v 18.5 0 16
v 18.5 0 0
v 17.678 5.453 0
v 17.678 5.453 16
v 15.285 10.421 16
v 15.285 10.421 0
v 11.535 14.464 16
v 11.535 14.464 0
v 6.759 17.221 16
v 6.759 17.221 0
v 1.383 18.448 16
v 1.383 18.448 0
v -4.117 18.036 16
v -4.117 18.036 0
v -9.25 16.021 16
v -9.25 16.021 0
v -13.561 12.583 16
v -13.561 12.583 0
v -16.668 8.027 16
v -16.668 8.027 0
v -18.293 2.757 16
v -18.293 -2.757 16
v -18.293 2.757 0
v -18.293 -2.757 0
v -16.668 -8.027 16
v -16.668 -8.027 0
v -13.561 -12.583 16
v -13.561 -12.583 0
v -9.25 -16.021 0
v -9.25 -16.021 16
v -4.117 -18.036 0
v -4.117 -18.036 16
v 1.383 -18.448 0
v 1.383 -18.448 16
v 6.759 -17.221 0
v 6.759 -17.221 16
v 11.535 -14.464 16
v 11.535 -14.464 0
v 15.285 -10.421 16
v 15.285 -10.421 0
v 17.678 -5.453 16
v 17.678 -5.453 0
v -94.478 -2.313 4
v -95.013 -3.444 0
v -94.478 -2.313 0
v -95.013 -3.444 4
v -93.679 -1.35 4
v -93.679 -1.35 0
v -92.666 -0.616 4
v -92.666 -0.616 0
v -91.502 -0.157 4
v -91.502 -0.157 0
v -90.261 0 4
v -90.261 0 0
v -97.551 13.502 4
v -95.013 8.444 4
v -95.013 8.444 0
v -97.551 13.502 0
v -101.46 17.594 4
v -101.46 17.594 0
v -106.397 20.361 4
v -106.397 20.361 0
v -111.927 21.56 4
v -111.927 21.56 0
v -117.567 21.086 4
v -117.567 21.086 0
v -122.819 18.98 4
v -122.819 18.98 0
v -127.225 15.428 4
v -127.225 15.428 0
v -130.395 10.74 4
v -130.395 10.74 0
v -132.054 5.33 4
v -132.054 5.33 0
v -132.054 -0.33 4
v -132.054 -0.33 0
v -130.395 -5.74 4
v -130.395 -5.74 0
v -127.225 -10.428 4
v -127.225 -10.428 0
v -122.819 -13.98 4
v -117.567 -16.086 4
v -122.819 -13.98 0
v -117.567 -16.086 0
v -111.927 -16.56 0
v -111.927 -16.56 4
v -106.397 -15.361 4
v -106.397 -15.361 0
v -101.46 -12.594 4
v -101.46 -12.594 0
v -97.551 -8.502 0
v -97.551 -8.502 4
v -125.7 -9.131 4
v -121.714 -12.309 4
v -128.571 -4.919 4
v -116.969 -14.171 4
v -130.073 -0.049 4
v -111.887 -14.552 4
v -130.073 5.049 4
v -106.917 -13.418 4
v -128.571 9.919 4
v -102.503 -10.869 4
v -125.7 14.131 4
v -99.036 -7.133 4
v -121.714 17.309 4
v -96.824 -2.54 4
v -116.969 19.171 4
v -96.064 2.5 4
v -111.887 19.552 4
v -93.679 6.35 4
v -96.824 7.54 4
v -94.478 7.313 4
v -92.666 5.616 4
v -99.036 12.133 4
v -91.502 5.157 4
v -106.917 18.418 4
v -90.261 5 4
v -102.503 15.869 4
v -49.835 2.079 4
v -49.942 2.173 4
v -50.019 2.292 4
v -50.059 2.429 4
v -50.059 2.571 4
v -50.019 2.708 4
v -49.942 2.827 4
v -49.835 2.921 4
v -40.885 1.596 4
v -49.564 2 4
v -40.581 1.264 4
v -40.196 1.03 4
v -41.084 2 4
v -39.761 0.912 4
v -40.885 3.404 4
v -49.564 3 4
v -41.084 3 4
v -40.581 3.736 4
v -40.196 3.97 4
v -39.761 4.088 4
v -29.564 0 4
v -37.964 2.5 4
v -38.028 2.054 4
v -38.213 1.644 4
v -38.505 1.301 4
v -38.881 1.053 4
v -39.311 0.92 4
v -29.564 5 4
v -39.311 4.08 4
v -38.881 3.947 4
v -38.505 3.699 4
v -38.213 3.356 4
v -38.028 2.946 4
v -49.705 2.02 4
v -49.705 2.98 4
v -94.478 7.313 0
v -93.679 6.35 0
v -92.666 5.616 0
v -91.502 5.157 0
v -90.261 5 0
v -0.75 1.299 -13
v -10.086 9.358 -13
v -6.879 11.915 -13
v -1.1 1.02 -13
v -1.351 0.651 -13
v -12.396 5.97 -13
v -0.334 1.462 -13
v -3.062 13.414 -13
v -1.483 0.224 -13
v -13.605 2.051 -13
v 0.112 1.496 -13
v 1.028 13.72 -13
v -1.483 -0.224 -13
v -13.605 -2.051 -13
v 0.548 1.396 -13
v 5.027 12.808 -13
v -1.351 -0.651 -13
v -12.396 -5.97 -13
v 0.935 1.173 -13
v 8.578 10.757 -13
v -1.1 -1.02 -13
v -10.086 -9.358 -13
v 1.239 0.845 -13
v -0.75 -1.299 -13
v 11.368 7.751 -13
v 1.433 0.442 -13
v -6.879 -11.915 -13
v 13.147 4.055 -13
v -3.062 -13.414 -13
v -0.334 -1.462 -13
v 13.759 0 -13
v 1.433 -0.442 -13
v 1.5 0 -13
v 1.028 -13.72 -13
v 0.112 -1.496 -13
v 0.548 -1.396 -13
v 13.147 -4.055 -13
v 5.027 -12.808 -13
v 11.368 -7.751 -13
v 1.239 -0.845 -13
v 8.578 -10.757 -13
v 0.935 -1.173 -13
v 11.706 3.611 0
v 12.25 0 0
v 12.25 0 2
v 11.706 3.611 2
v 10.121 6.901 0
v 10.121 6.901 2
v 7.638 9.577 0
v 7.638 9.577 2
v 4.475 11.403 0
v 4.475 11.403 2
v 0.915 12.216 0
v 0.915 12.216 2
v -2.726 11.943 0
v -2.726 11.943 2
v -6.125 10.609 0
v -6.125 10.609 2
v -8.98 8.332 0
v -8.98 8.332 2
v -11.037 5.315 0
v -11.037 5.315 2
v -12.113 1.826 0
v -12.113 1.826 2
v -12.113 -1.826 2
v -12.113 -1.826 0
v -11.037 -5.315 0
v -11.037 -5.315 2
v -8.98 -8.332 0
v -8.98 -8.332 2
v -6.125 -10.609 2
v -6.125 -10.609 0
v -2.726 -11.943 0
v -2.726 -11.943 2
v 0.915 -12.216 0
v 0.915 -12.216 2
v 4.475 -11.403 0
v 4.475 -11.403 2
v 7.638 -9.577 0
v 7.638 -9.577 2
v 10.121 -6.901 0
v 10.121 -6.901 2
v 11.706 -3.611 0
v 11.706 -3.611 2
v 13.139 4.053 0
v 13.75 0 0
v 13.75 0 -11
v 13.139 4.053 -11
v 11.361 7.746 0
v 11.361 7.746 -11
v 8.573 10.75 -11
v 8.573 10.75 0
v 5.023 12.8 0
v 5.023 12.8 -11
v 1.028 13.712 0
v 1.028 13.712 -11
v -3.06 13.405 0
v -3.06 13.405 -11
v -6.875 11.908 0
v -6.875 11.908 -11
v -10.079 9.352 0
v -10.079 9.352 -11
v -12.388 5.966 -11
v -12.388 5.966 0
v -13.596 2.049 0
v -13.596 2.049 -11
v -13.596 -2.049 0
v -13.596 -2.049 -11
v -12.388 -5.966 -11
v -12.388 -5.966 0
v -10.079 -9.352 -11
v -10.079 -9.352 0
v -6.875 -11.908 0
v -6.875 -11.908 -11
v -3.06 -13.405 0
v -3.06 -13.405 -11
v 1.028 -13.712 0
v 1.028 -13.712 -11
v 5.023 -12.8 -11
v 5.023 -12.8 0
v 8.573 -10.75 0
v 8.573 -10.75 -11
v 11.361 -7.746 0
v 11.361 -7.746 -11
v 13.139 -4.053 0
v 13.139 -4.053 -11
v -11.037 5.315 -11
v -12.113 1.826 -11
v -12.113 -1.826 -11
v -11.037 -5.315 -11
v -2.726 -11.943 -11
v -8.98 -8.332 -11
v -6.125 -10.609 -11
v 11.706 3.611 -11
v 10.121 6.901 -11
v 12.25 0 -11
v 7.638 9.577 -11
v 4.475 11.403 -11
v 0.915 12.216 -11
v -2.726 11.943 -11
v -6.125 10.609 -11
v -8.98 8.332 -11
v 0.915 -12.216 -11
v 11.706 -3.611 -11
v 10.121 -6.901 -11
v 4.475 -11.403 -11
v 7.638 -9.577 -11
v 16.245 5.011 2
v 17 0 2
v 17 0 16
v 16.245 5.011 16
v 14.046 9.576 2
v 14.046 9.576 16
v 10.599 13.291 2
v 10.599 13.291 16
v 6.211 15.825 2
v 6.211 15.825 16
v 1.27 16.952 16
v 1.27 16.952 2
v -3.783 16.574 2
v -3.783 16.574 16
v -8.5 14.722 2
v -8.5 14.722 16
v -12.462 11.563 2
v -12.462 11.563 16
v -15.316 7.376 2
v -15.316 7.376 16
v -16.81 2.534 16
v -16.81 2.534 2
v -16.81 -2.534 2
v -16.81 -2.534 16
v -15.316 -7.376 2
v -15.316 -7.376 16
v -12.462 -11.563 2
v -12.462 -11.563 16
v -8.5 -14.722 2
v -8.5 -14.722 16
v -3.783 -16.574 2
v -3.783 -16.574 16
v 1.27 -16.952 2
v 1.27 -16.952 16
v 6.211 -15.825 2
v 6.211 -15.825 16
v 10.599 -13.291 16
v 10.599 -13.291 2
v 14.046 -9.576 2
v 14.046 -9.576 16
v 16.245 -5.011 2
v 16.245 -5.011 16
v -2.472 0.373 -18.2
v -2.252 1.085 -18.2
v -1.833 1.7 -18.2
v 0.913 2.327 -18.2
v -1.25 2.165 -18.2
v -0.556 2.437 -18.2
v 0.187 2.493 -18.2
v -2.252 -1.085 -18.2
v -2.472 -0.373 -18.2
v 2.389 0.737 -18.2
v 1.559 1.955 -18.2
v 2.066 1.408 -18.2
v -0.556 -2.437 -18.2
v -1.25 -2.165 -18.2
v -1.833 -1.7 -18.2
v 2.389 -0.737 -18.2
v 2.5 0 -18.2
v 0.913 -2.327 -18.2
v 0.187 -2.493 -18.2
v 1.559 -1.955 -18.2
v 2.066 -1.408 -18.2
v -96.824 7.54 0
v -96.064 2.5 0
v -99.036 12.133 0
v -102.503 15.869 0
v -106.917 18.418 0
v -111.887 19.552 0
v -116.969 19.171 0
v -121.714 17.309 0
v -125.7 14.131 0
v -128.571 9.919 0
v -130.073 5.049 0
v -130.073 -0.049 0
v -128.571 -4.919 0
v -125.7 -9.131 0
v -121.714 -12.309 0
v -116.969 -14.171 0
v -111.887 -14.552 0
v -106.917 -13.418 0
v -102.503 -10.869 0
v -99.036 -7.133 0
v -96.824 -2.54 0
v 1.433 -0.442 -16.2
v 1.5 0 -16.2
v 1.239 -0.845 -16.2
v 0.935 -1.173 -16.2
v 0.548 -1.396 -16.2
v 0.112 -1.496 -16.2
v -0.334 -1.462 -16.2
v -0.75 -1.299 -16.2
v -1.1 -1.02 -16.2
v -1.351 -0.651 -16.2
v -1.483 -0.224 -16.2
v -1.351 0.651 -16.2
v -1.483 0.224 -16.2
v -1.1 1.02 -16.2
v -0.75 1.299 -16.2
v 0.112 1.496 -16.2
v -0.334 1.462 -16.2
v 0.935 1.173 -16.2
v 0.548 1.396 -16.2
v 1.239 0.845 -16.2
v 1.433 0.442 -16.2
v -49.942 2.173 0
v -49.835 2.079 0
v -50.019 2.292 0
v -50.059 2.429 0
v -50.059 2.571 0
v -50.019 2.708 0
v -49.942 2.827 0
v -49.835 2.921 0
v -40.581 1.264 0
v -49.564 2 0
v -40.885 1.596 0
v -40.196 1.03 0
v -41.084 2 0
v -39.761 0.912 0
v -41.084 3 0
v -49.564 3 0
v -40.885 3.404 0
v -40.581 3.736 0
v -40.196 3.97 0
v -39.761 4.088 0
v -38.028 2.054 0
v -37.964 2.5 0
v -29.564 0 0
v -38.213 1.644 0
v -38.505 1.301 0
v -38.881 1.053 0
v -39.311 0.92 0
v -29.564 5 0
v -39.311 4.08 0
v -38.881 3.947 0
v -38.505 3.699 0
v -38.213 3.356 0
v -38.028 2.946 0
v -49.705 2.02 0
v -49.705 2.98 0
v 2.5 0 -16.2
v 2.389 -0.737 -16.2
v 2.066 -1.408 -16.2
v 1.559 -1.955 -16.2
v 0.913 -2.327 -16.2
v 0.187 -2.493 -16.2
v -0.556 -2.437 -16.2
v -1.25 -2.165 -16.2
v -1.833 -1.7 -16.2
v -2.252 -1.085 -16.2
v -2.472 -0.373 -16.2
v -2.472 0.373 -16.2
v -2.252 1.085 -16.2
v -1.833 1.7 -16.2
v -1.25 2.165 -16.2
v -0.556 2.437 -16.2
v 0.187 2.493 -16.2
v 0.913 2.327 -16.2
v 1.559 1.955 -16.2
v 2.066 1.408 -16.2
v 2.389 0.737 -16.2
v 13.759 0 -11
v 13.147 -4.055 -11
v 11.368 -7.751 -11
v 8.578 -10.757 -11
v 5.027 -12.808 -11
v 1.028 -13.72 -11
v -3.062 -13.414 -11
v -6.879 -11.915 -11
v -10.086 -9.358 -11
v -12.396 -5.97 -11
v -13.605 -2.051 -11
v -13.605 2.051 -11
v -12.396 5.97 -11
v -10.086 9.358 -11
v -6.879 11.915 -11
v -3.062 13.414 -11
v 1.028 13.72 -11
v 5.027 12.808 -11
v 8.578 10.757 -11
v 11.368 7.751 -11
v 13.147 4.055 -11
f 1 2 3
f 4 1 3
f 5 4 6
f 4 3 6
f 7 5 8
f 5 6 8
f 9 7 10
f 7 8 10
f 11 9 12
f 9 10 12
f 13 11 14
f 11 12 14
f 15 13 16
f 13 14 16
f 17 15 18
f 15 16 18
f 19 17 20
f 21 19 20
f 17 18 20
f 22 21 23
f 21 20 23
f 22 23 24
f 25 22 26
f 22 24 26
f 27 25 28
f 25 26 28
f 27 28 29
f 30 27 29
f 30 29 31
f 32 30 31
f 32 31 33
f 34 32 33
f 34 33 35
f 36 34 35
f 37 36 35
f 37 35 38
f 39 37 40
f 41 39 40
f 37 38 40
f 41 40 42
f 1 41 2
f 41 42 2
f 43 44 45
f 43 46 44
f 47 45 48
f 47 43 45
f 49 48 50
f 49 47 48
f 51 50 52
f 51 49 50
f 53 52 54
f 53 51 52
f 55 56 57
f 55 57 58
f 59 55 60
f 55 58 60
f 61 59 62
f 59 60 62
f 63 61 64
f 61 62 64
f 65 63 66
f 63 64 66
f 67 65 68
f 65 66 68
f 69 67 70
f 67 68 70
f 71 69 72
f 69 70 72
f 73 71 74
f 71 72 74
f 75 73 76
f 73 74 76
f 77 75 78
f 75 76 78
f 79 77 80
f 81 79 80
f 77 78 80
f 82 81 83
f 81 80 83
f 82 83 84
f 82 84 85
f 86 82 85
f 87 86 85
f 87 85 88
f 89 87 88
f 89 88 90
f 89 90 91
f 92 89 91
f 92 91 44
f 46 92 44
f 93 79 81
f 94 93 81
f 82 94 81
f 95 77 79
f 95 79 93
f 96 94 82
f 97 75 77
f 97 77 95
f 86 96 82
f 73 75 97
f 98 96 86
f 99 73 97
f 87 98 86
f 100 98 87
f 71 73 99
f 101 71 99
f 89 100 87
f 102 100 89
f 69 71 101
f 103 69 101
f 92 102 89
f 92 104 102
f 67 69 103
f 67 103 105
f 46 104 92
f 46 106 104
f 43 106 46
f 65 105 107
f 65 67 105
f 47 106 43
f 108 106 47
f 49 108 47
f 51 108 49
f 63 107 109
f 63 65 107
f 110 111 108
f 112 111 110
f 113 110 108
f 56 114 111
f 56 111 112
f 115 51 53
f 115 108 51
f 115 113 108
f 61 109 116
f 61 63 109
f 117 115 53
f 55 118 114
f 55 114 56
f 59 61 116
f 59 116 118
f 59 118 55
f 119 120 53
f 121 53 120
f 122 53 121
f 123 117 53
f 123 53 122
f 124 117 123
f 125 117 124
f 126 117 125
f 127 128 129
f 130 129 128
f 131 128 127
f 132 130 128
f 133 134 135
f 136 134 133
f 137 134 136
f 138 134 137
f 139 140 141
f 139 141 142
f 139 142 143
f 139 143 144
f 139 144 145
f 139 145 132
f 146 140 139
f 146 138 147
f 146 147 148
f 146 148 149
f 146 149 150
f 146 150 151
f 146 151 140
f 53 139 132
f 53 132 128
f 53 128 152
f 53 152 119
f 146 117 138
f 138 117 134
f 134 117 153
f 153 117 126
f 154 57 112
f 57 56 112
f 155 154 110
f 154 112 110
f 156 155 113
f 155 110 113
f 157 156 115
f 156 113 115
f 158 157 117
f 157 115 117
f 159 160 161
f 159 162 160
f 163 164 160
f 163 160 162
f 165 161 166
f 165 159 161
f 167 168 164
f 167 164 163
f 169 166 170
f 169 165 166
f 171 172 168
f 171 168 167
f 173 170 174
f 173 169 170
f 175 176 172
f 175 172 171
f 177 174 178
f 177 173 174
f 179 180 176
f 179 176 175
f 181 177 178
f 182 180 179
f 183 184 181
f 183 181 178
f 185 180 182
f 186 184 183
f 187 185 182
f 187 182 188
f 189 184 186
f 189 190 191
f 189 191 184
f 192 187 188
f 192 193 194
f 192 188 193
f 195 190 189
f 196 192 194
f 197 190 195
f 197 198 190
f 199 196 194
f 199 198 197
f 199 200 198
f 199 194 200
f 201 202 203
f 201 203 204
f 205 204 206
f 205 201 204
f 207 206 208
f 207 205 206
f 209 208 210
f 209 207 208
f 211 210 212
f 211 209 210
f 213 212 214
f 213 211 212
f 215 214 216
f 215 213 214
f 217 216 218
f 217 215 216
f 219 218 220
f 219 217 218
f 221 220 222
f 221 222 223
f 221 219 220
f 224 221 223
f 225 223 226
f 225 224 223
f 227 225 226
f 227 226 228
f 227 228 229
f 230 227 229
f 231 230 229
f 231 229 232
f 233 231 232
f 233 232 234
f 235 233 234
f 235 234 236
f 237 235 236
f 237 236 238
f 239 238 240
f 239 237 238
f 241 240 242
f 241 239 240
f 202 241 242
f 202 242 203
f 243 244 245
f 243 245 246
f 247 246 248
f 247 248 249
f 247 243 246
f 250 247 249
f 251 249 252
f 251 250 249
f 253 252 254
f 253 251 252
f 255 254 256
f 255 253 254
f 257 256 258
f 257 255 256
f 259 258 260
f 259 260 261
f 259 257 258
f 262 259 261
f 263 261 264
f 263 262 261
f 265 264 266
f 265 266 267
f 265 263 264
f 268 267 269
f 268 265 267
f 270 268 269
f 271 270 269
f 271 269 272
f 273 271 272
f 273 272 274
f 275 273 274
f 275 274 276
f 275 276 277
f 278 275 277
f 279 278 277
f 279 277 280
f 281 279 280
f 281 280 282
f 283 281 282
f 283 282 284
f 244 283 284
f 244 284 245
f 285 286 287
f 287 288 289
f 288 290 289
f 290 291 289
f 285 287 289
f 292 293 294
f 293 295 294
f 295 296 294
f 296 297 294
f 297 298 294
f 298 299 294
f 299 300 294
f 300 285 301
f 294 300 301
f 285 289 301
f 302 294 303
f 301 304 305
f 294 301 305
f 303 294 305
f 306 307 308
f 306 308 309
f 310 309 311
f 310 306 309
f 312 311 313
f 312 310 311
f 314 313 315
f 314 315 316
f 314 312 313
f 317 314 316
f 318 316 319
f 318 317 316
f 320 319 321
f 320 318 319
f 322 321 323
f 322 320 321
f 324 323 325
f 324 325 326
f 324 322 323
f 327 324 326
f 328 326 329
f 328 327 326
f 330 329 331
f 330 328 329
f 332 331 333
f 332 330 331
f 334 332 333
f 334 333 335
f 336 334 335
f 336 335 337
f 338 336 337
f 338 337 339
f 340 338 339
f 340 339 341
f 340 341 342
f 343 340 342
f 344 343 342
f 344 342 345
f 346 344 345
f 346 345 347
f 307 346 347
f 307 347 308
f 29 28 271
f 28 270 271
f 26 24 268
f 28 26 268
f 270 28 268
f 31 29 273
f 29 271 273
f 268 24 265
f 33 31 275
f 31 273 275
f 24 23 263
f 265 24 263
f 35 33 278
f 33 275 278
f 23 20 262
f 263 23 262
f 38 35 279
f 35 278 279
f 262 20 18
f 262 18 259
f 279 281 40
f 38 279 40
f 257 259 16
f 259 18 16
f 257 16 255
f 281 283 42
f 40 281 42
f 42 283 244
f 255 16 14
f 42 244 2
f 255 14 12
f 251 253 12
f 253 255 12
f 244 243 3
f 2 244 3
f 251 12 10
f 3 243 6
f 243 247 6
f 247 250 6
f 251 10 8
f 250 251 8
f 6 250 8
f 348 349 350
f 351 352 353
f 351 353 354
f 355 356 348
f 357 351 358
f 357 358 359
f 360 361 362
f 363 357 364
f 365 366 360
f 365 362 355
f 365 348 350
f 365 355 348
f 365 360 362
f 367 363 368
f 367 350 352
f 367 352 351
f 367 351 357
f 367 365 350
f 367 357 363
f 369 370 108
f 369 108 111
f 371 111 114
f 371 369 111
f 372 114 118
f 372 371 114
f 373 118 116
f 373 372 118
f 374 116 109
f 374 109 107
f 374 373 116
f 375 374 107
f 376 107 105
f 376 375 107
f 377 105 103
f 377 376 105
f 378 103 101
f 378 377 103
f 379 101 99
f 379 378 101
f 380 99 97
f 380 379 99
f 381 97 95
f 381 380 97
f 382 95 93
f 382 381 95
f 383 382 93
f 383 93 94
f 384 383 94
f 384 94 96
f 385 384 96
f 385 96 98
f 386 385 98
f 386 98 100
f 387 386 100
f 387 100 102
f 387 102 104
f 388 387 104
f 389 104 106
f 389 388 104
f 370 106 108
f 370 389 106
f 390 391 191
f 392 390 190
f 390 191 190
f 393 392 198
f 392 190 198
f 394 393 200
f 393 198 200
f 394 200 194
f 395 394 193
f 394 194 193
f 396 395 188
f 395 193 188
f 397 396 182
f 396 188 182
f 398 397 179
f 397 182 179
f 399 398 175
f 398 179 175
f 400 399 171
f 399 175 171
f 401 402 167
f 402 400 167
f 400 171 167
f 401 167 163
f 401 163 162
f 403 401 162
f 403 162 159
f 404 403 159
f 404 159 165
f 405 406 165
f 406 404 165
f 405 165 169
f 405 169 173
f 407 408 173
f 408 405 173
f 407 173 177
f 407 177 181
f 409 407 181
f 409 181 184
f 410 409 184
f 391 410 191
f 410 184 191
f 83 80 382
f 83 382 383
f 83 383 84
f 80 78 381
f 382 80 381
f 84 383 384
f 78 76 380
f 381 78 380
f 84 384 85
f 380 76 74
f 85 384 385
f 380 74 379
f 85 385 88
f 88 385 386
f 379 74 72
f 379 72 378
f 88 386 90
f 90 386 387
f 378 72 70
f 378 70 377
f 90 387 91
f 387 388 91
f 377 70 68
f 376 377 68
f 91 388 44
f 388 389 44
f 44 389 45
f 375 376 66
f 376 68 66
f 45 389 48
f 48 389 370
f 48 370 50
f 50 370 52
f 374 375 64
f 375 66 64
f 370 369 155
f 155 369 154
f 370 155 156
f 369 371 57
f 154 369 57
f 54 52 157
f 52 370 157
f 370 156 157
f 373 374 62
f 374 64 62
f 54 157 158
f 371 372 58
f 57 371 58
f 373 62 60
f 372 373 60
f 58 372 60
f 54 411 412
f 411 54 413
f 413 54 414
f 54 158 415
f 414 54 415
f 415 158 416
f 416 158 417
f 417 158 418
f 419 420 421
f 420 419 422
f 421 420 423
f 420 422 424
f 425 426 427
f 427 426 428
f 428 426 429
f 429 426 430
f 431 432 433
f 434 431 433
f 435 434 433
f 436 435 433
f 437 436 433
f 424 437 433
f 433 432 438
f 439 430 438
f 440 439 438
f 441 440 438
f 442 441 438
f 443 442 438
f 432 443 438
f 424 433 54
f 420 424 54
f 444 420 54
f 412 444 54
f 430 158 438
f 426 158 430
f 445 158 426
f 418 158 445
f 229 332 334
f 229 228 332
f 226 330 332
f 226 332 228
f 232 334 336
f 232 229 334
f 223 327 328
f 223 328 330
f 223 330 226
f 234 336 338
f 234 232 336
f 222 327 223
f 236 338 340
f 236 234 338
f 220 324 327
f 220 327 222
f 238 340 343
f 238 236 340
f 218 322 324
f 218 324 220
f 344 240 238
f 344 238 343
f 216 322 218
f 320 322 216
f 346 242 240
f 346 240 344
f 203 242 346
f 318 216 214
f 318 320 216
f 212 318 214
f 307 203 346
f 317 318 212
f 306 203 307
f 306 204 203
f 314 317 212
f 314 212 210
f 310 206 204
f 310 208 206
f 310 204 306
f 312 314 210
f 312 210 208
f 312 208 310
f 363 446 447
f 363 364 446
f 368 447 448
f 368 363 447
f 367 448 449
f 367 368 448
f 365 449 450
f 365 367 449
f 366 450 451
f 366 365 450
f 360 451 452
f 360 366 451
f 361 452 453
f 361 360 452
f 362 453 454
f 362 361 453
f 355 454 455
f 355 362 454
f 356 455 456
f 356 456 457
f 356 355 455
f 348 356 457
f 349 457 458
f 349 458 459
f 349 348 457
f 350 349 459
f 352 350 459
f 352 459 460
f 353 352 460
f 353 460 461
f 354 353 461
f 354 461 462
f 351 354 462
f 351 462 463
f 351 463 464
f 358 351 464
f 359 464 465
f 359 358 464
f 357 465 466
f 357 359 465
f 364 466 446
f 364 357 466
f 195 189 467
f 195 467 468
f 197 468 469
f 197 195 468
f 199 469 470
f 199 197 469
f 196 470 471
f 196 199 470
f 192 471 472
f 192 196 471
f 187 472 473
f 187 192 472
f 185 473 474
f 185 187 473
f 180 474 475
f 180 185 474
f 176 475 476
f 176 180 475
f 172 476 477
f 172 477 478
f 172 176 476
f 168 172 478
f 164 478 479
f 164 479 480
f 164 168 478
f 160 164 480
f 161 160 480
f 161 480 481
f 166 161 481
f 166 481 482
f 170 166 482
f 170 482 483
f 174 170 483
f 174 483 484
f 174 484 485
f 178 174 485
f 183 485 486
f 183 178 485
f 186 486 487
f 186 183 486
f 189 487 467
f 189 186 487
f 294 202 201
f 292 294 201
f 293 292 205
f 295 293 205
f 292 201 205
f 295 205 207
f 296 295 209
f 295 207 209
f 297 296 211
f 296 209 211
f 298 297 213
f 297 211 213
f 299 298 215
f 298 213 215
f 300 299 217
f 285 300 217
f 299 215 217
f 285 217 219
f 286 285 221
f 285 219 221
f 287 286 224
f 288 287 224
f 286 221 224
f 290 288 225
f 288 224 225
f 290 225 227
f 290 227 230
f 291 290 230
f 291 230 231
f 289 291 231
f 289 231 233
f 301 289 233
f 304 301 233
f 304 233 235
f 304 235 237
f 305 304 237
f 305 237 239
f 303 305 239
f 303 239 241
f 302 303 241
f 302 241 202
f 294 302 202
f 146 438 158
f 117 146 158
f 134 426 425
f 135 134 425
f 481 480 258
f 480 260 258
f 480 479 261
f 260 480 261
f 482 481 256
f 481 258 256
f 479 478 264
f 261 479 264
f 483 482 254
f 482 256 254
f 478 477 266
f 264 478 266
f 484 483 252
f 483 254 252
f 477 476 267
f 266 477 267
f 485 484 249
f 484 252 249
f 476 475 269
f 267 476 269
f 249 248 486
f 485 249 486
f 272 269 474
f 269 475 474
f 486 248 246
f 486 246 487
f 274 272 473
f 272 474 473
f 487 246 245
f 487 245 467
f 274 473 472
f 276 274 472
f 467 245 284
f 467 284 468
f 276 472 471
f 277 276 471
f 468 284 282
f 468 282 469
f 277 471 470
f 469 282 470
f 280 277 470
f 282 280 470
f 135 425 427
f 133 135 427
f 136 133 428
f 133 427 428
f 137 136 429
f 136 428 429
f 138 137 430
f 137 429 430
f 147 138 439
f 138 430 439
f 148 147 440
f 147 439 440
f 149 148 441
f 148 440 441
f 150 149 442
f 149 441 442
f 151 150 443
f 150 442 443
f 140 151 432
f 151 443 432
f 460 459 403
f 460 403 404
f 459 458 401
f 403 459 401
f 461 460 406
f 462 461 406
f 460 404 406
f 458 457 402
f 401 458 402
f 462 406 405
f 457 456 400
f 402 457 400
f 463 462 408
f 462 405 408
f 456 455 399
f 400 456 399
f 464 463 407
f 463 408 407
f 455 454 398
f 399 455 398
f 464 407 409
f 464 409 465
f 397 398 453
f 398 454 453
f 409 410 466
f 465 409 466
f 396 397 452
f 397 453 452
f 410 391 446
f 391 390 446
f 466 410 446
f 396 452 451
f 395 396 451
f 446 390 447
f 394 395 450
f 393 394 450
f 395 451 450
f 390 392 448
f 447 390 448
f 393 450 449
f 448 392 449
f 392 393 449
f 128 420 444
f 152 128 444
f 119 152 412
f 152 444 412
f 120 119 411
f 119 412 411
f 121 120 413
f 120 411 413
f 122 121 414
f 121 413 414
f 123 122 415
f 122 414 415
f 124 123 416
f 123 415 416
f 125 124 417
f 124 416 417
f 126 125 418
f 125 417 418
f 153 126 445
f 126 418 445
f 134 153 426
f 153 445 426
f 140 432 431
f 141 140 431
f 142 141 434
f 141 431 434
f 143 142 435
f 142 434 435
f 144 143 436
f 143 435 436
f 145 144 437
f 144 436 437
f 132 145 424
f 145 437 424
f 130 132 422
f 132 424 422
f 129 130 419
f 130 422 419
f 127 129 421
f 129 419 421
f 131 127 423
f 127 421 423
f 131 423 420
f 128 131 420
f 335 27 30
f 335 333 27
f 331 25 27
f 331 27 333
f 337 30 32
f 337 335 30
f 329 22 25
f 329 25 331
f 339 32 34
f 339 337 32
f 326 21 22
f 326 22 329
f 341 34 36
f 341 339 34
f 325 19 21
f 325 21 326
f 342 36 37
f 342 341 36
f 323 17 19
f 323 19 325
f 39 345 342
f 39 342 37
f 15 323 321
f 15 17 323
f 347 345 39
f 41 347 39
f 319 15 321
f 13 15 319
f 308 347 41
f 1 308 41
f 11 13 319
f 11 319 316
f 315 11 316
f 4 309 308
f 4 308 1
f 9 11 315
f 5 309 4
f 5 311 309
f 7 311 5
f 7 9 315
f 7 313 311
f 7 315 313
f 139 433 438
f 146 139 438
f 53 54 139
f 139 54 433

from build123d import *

# Parameters (mm, degrees)
F0_R      = 18.5
F0_R_2    = 17
F1_DEPTH  = 16
F0_R_3    = 13.75
F0_R_4    = 12.25
F2_DEPTH  = 13
F3_DEPTH  = 2
F4_R      = 13.7587018694
F5_DEPTH  = 2
F6_DEPTH  = 2
F7_R      = 1.5
F8_DEPTH  = 4.2
F9_R      = 2.5
F9_R_2    = 1.5
F10_DEPTH = 1
F11_R     = 17.1
F12_DEPTH = 4
F13_R     = 5


with BuildPart() as f1:
    # F0 (on Top) → F1 (new body)
    with BuildSketch(Plane.XY):
        Circle(F0_R)
        Circle(F0_R_2, mode=Mode.SUBTRACT)
    extrude(amount=F1_DEPTH)



with BuildPart() as f2:
    # F0 (on Top) → F2 (new body)
    with BuildSketch(Plane.XY):
        Circle(F0_R_3)
        Circle(F0_R_4, mode=Mode.SUBTRACT)
    extrude(amount=-F2_DEPTH)


with BuildPart() as f1_1:
    add(f1.part)

    add(f2.part)  # F3 merges F2
    # F0 (on Top) → F3 (join)
    with BuildSketch(Plane.XY):
        Circle(F0_R_2)
        Circle(F0_R_3, mode=Mode.SUBTRACT)
    extrude(amount=F3_DEPTH)

    # F4 (on face) → F5 (join)
    with BuildSketch(Plane(origin=(0, 0, -13), x_dir=(1, 0, 0), z_dir=(0, 0, -1))):
        Circle(F4_R)
    extrude(amount=-F5_DEPTH)

    # F0 (on Top) → F6 (join)
    with BuildSketch(Plane.XY):
        Circle(F0_R_3)
        Circle(F0_R_4, mode=Mode.SUBTRACT)
    extrude(amount=F6_DEPTH)

    # F7 (on face) → F8 (join)
    with BuildSketch(Plane(origin=(0, 0, -13), x_dir=(1, 0, 0), z_dir=(0, 0, -1))):
        Circle(F7_R)
    extrude(amount=F8_DEPTH)

    # F9 (on face) → F10 (join, symmetric)
    with BuildSketch(Plane(origin=(0, 0, -17.2), x_dir=(1, 0, 0), z_dir=(0, 0, -1))):
        Circle(F9_R)
        Circle(F9_R_2, mode=Mode.SUBTRACT)
        Circle(F9_R_2)
    extrude(amount=F10_DEPTH, both=True)


with BuildPart() as f12:
    # F11 (on Top) → F12 (new body)
    with BuildSketch(Plane.XY):
        with BuildLine():
            ThreePointArc((-94.2287065711, 5), (-132.2643871768, 2.5), (-94.2287065711, 0))
            Line((-94.2287065711, 0), (-94.5643871768, 0))
            Line((-94.5643871768, 0), (-94.5643871768, 5))
            Line((-94.5643871768, 5), (-94.2287065711, 5))
        make_face()
        with Locations((-113.1643871768, 2.5)):
            Circle(F11_R, mode=Mode.SUBTRACT)
        with BuildLine():
            Line((-94.2287065711, 0), (-29.5643871768, 0))
            Line((-29.5643871768, 0), (-29.5643871768, 5))
            Line((-29.5643871768, 5), (-94.2287065711, 5))
            ThreePointArc((-94.2287065711, 5), (-94.1055112974, 3.7526971764), (-94.0643871768, 2.5))
            ThreePointArc((-94.0643871768, 2.5), (-94.1055112974, 1.2473028236), (-94.2287065711, 0))
        make_face()
        with BuildLine():
            ThreePointArc((-41.0842555921, 3), (-39.3111969958, 4.0798400971), (-37.9643871768, 2.5))
            ThreePointArc((-37.9643871768, 2.5), (-39.3111969958, 0.9201599029), (-41.0842555921, 2))
            Line((-41.0842555921, 2), (-49.5643871768, 2))
            ThreePointArc((-49.5643871768, 2), (-50.0643871768, 2.5), (-49.5643871768, 3))
            Line((-49.5643871768, 3), (-41.0842555921, 3))
        make_face(mode=Mode.SUBTRACT)
        with BuildLine():
            Line((-94.5643871768, 0), (-94.2287065711, 0))
            ThreePointArc((-94.2287065711, 0), (-94.1055112974, 1.2473028236), (-94.0643871768, 2.5))
            ThreePointArc((-94.0643871768, 2.5), (-94.1055112974, 3.7526971764), (-94.2287065711, 5))
            Line((-94.2287065711, 5), (-94.5643871768, 5))
            Line((-94.5643871768, 5), (-94.5643871768, 0))
        make_face()
    extrude(amount=F12_DEPTH)

    # F13
    f13_edges = [f12.edges().sort_by_distance(p)[0] for p in [
        (-94.228707, 5, 2),
        (-94.228707, 0, 2),
    ]]
    fillet(f13_edges, radius=F13_R)


solid = Compound([f1_1.part, f12.part])
